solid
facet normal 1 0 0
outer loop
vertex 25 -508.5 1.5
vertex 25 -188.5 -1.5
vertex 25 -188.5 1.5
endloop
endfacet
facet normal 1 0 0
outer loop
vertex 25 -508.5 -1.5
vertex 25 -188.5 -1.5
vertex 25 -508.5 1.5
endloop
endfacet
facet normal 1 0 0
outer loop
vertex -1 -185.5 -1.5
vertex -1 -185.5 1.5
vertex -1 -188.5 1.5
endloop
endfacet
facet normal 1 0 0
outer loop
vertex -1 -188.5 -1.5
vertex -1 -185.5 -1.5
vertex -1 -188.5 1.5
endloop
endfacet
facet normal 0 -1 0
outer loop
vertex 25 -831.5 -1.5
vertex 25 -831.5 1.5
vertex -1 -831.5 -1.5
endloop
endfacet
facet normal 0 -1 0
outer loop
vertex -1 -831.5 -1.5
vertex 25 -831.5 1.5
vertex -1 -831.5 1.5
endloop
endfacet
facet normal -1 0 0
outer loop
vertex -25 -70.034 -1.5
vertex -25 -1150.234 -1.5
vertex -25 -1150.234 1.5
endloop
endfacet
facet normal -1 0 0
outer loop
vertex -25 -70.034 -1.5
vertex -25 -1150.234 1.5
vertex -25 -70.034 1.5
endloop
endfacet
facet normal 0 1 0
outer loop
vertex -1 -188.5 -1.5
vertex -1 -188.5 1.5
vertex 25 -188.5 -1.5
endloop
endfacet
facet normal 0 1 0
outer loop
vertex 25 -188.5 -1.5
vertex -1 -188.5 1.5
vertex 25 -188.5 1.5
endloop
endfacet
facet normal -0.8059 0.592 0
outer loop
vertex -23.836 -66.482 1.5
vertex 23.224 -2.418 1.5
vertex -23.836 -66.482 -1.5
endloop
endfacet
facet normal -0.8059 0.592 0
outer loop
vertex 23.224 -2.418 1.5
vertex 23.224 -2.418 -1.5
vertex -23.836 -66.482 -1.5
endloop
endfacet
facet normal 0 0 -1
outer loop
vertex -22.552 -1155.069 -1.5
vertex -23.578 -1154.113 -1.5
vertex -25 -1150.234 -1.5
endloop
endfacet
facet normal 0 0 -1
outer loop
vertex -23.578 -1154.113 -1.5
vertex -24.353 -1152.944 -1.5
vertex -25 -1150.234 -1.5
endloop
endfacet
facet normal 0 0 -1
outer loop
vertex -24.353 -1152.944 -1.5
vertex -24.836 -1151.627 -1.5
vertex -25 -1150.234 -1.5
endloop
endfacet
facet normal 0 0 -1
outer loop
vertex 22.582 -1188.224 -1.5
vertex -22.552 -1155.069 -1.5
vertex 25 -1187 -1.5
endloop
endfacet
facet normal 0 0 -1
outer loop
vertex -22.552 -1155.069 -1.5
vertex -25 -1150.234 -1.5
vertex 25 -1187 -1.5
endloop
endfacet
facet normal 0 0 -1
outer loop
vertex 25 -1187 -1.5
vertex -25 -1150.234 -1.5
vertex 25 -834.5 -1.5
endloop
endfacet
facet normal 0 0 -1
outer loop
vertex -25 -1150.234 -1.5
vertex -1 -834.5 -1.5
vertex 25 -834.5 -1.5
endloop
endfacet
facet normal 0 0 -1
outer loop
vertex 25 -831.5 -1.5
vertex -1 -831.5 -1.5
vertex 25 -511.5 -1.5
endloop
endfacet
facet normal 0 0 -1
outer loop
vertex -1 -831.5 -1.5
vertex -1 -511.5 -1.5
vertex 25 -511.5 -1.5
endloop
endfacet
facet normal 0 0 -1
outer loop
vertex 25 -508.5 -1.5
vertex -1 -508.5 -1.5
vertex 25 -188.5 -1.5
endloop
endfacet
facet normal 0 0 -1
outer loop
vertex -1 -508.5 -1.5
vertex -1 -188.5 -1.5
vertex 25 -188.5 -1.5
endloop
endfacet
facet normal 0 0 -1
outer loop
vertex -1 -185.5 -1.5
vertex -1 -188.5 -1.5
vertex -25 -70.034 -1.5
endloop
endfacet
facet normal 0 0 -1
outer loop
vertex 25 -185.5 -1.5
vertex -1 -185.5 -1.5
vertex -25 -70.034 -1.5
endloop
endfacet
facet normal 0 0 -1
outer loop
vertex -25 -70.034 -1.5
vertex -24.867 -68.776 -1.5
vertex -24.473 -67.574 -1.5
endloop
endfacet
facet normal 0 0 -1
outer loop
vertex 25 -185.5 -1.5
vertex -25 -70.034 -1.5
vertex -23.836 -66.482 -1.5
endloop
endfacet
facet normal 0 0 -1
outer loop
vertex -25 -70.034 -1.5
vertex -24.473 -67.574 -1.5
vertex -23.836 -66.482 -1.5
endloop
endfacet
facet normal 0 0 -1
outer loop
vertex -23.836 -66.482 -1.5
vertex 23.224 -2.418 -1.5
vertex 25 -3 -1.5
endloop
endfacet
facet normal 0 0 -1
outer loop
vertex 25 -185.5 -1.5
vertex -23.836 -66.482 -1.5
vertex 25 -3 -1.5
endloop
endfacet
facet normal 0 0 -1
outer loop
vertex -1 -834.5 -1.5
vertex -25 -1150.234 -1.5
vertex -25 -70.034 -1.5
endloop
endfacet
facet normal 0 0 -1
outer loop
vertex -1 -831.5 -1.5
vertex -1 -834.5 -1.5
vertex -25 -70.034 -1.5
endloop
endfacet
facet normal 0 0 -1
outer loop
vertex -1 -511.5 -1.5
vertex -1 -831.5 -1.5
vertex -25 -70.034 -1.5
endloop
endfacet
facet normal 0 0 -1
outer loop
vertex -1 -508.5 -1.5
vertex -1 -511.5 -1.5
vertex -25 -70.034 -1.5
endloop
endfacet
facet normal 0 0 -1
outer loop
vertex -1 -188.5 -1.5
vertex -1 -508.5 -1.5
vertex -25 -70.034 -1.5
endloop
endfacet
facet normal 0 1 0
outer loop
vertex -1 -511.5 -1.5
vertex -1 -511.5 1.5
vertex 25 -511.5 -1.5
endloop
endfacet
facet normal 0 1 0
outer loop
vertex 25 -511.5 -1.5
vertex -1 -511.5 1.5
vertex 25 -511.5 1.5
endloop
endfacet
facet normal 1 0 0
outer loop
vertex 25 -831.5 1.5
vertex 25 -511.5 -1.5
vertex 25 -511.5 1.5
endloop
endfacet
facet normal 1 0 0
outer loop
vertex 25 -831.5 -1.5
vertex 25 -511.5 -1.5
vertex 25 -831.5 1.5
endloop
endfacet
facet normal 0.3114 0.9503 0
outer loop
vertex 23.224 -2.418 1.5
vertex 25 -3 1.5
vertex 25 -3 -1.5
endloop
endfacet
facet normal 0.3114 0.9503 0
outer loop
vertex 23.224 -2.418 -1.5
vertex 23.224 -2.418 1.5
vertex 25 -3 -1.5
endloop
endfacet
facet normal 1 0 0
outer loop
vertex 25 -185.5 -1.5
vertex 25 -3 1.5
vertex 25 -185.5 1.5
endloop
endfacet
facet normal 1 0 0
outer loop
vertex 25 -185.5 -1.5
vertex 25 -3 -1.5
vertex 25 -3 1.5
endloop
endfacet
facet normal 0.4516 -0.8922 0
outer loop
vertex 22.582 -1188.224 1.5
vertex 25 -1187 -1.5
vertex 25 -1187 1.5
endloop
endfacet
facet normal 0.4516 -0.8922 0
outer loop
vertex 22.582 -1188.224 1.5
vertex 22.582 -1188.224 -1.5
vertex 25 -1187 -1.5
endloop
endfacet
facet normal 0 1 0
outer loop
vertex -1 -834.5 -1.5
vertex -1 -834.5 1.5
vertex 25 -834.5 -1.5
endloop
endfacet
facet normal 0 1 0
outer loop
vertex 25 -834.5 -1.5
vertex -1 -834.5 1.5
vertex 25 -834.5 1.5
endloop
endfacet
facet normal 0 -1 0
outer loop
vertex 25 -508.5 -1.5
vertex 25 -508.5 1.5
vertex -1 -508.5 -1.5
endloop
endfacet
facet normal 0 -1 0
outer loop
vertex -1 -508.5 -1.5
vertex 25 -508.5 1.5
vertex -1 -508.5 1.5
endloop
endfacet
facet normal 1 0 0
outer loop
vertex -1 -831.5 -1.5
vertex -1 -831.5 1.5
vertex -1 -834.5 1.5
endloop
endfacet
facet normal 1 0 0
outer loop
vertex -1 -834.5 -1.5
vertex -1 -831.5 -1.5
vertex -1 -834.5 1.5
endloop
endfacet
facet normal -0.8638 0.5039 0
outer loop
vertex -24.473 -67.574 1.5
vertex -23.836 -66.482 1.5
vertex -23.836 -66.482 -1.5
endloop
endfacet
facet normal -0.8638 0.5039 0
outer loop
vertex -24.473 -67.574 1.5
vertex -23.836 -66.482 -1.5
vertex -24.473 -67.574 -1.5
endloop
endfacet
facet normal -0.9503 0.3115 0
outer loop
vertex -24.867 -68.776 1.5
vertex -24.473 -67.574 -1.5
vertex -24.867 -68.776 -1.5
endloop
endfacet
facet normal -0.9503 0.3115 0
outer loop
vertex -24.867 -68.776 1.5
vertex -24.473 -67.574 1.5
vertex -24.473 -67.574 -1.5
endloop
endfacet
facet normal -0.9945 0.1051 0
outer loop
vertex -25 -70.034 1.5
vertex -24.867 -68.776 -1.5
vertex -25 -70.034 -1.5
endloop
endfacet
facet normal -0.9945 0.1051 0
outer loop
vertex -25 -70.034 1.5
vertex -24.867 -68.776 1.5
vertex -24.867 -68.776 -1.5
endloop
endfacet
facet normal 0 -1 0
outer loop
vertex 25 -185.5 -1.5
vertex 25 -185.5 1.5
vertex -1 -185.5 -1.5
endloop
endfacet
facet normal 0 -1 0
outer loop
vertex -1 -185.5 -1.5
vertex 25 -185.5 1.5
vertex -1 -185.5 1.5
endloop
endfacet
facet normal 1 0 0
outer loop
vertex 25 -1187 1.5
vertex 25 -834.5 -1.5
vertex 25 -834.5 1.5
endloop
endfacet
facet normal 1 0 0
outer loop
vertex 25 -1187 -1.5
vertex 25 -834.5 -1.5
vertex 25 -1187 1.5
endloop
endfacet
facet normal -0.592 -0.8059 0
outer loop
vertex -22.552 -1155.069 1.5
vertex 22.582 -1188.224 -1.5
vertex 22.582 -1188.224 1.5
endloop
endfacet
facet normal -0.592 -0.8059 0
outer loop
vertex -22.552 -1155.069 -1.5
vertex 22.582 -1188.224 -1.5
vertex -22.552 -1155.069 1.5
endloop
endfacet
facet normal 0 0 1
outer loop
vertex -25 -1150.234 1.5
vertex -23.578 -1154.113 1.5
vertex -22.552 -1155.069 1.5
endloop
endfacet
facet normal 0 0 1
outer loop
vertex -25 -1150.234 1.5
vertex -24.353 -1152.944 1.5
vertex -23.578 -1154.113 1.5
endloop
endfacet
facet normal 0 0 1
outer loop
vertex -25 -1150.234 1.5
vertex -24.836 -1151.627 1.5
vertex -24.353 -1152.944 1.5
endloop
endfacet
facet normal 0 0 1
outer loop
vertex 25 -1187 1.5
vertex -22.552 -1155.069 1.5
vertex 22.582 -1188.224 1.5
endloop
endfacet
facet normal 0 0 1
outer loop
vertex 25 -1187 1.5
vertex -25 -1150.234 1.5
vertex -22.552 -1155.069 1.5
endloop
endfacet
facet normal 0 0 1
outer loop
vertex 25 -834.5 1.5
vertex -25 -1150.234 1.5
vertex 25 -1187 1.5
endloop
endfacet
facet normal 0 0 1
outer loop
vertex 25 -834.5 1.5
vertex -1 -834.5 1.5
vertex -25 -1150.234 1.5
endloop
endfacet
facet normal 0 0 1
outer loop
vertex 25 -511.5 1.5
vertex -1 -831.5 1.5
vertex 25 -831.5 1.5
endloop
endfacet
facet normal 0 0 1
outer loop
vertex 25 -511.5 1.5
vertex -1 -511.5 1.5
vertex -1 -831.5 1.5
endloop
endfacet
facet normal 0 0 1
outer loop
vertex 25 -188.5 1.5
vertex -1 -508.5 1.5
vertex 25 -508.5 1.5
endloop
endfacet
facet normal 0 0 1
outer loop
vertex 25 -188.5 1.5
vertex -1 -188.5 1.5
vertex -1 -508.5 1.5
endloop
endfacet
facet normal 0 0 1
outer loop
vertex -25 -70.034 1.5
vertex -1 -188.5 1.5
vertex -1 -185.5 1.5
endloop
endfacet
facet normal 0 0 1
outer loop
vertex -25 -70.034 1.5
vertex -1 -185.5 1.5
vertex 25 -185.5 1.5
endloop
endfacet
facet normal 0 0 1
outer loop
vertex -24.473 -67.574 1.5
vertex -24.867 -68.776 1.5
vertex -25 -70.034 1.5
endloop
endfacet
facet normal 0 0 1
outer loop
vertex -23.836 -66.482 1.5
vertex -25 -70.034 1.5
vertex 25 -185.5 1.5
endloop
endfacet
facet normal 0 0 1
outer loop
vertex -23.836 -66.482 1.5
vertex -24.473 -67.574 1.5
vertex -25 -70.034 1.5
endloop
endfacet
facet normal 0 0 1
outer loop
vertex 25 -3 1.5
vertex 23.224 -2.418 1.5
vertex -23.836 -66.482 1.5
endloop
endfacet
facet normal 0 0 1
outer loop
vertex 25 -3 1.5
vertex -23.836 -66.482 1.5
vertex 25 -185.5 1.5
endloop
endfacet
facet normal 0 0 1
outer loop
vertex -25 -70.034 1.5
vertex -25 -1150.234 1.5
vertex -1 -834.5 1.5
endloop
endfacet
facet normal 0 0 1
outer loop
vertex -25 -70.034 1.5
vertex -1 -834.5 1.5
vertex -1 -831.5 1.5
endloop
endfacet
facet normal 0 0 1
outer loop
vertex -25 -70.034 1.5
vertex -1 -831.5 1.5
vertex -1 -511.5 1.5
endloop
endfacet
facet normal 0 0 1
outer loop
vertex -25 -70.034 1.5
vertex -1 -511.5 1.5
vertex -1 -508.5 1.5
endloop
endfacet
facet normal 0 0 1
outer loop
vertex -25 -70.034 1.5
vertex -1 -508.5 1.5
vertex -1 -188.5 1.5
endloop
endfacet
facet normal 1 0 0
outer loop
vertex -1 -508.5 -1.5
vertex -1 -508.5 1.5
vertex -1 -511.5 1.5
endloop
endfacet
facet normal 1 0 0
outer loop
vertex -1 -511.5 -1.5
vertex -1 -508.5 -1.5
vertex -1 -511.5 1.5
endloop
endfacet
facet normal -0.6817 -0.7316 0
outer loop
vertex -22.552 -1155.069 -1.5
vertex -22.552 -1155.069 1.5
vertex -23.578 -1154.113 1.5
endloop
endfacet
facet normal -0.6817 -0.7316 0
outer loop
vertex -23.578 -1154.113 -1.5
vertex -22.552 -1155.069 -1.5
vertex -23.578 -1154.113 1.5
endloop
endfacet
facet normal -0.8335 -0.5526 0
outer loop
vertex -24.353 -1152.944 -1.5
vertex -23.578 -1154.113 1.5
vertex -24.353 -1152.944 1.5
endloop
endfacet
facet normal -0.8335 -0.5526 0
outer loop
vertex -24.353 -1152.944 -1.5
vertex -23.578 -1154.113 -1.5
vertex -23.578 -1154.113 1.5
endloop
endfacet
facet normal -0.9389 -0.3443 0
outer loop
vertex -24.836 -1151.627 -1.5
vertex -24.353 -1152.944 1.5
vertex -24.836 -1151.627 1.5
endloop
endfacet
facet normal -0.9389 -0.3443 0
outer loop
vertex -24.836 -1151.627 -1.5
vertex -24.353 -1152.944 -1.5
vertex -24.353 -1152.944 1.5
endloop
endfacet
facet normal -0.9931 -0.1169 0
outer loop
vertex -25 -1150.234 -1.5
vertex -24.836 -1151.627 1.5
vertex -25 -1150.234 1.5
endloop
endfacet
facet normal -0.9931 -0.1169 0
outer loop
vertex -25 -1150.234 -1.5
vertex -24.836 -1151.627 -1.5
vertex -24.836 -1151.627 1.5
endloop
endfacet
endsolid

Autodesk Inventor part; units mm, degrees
ref_plane "YZ Plane" through (0, 0, 0) normal (1, 0, 0) x (0, 1, 0)
ref_plane "XZ Plane" through (0, 0, 0) normal (0, 1, 0) x (-1, 0, 0)
ref_plane "XY Plane" through (0, 0, 0) normal (0, 0, 1) x (1, 0, 0)
sketch "Sketch1" plane through (0, 0, 0) normal (0, 0, 1) x (1, 0, 0)
  line L0 (-25, 0) -> (25, 0)
  line L1 (25, 0) -> (25, -1190)
  line L2 (25, -1190) -> (-25, -1190)
  line L3 (-25, -1190) -> (-25, 0)
  line L4 (25, -1190) -> (-25, -1153.2713)
  line L5 (25, 0) -> (-25, -68.0668)
  point P0 (0, 0)
  point P1 (0, 0)
  point P2 (25, -1153.2713)
  dimension "d0" = 50
  dimension "d1" = 1190
  dimension "d5" = 53.7
  dimension "d6" = 53.7
extrude "Plate1" add sketch "Sketch1" along normal mid plane 3 contours L1 L4 L3 L5
chamfer "Corner Chamfer1" distance 3 angle 45 1 edges at (25, -1190, 0)
fillet "Corner Round1" radius 6 1 edges at (-25, -1153.2713, 0)
fillet "Corner Round2" radius 6 1 edges at (-25, -68.0668, 0)
chamfer "Corner Chamfer3" distance 3 angle 45 1 edges at (25, 0, 0)
sketch "Sketch3" plane through (0, 0, 1.5) normal (0, 0, 1) x (1, 0, 0)
  line L0 (-1, -188.5) -> (25, -188.5)
  line L1 (25, -188.5) -> (25, -185.5)
  line L2 (25, -185.5) -> (-1, -185.5)
  line L3 (-1, -185.5) -> (-1, -188.5)
  line L4 (25, -3) -> (25, -1187) projected
  point P0 (0, 0)
  point P1 (25, -187)
  dimension "d18" = 187
  dimension "d19" = 26
  dimension "d20" = 3
extrude "Extrusion1" cut sketch "Sketch3" against normal through all
pattern_linear "Rectangular Pattern1" count 3 spacing 323 along (0, -1, 0) of "Extrusion1"
sketch "Sketch4" plane through (0, 0, -1.5) normal (0, 0, -1) x (-1, 0, 0)
  line L0 (-5.565, -286.9038) -> (3.4627, -286.9038) construction
  line L1 (3.4627, -286.9038) -> (3.4627, -416.417) construction
  line L2 (3.4627, -416.417) -> (-5.565, -416.417) construction
  line L3 (-5.565, -416.417) -> (-5.565, -286.9038) construction
  point P0 (0, 0)
mark "Mark1"
equation "\"d6\" = d5"
equation "\"d2\" = Thickness"
equation "\"BendReliefWidth\" = Thickness"
equation "\"BendReliefDepth\" = 0.5 * Thickness"
equation "\"CornerReliefSize\" = 4 * Thickness"
equation "\"MinimumRemnant\" = 2 * Thickness"
equation "\"TransitionRadius\" = BendRadius"
equation "\"JacobiRadiusSize\" = BendRadius"
equation "\"GapSize\" = Thickness"
equation "\"Thickness\" = 3"
equation "\"BendRadius\" = 5"
properties part number "MSC 602 STRINGER CONE EXIT BACK" material "Stainless Steel"
